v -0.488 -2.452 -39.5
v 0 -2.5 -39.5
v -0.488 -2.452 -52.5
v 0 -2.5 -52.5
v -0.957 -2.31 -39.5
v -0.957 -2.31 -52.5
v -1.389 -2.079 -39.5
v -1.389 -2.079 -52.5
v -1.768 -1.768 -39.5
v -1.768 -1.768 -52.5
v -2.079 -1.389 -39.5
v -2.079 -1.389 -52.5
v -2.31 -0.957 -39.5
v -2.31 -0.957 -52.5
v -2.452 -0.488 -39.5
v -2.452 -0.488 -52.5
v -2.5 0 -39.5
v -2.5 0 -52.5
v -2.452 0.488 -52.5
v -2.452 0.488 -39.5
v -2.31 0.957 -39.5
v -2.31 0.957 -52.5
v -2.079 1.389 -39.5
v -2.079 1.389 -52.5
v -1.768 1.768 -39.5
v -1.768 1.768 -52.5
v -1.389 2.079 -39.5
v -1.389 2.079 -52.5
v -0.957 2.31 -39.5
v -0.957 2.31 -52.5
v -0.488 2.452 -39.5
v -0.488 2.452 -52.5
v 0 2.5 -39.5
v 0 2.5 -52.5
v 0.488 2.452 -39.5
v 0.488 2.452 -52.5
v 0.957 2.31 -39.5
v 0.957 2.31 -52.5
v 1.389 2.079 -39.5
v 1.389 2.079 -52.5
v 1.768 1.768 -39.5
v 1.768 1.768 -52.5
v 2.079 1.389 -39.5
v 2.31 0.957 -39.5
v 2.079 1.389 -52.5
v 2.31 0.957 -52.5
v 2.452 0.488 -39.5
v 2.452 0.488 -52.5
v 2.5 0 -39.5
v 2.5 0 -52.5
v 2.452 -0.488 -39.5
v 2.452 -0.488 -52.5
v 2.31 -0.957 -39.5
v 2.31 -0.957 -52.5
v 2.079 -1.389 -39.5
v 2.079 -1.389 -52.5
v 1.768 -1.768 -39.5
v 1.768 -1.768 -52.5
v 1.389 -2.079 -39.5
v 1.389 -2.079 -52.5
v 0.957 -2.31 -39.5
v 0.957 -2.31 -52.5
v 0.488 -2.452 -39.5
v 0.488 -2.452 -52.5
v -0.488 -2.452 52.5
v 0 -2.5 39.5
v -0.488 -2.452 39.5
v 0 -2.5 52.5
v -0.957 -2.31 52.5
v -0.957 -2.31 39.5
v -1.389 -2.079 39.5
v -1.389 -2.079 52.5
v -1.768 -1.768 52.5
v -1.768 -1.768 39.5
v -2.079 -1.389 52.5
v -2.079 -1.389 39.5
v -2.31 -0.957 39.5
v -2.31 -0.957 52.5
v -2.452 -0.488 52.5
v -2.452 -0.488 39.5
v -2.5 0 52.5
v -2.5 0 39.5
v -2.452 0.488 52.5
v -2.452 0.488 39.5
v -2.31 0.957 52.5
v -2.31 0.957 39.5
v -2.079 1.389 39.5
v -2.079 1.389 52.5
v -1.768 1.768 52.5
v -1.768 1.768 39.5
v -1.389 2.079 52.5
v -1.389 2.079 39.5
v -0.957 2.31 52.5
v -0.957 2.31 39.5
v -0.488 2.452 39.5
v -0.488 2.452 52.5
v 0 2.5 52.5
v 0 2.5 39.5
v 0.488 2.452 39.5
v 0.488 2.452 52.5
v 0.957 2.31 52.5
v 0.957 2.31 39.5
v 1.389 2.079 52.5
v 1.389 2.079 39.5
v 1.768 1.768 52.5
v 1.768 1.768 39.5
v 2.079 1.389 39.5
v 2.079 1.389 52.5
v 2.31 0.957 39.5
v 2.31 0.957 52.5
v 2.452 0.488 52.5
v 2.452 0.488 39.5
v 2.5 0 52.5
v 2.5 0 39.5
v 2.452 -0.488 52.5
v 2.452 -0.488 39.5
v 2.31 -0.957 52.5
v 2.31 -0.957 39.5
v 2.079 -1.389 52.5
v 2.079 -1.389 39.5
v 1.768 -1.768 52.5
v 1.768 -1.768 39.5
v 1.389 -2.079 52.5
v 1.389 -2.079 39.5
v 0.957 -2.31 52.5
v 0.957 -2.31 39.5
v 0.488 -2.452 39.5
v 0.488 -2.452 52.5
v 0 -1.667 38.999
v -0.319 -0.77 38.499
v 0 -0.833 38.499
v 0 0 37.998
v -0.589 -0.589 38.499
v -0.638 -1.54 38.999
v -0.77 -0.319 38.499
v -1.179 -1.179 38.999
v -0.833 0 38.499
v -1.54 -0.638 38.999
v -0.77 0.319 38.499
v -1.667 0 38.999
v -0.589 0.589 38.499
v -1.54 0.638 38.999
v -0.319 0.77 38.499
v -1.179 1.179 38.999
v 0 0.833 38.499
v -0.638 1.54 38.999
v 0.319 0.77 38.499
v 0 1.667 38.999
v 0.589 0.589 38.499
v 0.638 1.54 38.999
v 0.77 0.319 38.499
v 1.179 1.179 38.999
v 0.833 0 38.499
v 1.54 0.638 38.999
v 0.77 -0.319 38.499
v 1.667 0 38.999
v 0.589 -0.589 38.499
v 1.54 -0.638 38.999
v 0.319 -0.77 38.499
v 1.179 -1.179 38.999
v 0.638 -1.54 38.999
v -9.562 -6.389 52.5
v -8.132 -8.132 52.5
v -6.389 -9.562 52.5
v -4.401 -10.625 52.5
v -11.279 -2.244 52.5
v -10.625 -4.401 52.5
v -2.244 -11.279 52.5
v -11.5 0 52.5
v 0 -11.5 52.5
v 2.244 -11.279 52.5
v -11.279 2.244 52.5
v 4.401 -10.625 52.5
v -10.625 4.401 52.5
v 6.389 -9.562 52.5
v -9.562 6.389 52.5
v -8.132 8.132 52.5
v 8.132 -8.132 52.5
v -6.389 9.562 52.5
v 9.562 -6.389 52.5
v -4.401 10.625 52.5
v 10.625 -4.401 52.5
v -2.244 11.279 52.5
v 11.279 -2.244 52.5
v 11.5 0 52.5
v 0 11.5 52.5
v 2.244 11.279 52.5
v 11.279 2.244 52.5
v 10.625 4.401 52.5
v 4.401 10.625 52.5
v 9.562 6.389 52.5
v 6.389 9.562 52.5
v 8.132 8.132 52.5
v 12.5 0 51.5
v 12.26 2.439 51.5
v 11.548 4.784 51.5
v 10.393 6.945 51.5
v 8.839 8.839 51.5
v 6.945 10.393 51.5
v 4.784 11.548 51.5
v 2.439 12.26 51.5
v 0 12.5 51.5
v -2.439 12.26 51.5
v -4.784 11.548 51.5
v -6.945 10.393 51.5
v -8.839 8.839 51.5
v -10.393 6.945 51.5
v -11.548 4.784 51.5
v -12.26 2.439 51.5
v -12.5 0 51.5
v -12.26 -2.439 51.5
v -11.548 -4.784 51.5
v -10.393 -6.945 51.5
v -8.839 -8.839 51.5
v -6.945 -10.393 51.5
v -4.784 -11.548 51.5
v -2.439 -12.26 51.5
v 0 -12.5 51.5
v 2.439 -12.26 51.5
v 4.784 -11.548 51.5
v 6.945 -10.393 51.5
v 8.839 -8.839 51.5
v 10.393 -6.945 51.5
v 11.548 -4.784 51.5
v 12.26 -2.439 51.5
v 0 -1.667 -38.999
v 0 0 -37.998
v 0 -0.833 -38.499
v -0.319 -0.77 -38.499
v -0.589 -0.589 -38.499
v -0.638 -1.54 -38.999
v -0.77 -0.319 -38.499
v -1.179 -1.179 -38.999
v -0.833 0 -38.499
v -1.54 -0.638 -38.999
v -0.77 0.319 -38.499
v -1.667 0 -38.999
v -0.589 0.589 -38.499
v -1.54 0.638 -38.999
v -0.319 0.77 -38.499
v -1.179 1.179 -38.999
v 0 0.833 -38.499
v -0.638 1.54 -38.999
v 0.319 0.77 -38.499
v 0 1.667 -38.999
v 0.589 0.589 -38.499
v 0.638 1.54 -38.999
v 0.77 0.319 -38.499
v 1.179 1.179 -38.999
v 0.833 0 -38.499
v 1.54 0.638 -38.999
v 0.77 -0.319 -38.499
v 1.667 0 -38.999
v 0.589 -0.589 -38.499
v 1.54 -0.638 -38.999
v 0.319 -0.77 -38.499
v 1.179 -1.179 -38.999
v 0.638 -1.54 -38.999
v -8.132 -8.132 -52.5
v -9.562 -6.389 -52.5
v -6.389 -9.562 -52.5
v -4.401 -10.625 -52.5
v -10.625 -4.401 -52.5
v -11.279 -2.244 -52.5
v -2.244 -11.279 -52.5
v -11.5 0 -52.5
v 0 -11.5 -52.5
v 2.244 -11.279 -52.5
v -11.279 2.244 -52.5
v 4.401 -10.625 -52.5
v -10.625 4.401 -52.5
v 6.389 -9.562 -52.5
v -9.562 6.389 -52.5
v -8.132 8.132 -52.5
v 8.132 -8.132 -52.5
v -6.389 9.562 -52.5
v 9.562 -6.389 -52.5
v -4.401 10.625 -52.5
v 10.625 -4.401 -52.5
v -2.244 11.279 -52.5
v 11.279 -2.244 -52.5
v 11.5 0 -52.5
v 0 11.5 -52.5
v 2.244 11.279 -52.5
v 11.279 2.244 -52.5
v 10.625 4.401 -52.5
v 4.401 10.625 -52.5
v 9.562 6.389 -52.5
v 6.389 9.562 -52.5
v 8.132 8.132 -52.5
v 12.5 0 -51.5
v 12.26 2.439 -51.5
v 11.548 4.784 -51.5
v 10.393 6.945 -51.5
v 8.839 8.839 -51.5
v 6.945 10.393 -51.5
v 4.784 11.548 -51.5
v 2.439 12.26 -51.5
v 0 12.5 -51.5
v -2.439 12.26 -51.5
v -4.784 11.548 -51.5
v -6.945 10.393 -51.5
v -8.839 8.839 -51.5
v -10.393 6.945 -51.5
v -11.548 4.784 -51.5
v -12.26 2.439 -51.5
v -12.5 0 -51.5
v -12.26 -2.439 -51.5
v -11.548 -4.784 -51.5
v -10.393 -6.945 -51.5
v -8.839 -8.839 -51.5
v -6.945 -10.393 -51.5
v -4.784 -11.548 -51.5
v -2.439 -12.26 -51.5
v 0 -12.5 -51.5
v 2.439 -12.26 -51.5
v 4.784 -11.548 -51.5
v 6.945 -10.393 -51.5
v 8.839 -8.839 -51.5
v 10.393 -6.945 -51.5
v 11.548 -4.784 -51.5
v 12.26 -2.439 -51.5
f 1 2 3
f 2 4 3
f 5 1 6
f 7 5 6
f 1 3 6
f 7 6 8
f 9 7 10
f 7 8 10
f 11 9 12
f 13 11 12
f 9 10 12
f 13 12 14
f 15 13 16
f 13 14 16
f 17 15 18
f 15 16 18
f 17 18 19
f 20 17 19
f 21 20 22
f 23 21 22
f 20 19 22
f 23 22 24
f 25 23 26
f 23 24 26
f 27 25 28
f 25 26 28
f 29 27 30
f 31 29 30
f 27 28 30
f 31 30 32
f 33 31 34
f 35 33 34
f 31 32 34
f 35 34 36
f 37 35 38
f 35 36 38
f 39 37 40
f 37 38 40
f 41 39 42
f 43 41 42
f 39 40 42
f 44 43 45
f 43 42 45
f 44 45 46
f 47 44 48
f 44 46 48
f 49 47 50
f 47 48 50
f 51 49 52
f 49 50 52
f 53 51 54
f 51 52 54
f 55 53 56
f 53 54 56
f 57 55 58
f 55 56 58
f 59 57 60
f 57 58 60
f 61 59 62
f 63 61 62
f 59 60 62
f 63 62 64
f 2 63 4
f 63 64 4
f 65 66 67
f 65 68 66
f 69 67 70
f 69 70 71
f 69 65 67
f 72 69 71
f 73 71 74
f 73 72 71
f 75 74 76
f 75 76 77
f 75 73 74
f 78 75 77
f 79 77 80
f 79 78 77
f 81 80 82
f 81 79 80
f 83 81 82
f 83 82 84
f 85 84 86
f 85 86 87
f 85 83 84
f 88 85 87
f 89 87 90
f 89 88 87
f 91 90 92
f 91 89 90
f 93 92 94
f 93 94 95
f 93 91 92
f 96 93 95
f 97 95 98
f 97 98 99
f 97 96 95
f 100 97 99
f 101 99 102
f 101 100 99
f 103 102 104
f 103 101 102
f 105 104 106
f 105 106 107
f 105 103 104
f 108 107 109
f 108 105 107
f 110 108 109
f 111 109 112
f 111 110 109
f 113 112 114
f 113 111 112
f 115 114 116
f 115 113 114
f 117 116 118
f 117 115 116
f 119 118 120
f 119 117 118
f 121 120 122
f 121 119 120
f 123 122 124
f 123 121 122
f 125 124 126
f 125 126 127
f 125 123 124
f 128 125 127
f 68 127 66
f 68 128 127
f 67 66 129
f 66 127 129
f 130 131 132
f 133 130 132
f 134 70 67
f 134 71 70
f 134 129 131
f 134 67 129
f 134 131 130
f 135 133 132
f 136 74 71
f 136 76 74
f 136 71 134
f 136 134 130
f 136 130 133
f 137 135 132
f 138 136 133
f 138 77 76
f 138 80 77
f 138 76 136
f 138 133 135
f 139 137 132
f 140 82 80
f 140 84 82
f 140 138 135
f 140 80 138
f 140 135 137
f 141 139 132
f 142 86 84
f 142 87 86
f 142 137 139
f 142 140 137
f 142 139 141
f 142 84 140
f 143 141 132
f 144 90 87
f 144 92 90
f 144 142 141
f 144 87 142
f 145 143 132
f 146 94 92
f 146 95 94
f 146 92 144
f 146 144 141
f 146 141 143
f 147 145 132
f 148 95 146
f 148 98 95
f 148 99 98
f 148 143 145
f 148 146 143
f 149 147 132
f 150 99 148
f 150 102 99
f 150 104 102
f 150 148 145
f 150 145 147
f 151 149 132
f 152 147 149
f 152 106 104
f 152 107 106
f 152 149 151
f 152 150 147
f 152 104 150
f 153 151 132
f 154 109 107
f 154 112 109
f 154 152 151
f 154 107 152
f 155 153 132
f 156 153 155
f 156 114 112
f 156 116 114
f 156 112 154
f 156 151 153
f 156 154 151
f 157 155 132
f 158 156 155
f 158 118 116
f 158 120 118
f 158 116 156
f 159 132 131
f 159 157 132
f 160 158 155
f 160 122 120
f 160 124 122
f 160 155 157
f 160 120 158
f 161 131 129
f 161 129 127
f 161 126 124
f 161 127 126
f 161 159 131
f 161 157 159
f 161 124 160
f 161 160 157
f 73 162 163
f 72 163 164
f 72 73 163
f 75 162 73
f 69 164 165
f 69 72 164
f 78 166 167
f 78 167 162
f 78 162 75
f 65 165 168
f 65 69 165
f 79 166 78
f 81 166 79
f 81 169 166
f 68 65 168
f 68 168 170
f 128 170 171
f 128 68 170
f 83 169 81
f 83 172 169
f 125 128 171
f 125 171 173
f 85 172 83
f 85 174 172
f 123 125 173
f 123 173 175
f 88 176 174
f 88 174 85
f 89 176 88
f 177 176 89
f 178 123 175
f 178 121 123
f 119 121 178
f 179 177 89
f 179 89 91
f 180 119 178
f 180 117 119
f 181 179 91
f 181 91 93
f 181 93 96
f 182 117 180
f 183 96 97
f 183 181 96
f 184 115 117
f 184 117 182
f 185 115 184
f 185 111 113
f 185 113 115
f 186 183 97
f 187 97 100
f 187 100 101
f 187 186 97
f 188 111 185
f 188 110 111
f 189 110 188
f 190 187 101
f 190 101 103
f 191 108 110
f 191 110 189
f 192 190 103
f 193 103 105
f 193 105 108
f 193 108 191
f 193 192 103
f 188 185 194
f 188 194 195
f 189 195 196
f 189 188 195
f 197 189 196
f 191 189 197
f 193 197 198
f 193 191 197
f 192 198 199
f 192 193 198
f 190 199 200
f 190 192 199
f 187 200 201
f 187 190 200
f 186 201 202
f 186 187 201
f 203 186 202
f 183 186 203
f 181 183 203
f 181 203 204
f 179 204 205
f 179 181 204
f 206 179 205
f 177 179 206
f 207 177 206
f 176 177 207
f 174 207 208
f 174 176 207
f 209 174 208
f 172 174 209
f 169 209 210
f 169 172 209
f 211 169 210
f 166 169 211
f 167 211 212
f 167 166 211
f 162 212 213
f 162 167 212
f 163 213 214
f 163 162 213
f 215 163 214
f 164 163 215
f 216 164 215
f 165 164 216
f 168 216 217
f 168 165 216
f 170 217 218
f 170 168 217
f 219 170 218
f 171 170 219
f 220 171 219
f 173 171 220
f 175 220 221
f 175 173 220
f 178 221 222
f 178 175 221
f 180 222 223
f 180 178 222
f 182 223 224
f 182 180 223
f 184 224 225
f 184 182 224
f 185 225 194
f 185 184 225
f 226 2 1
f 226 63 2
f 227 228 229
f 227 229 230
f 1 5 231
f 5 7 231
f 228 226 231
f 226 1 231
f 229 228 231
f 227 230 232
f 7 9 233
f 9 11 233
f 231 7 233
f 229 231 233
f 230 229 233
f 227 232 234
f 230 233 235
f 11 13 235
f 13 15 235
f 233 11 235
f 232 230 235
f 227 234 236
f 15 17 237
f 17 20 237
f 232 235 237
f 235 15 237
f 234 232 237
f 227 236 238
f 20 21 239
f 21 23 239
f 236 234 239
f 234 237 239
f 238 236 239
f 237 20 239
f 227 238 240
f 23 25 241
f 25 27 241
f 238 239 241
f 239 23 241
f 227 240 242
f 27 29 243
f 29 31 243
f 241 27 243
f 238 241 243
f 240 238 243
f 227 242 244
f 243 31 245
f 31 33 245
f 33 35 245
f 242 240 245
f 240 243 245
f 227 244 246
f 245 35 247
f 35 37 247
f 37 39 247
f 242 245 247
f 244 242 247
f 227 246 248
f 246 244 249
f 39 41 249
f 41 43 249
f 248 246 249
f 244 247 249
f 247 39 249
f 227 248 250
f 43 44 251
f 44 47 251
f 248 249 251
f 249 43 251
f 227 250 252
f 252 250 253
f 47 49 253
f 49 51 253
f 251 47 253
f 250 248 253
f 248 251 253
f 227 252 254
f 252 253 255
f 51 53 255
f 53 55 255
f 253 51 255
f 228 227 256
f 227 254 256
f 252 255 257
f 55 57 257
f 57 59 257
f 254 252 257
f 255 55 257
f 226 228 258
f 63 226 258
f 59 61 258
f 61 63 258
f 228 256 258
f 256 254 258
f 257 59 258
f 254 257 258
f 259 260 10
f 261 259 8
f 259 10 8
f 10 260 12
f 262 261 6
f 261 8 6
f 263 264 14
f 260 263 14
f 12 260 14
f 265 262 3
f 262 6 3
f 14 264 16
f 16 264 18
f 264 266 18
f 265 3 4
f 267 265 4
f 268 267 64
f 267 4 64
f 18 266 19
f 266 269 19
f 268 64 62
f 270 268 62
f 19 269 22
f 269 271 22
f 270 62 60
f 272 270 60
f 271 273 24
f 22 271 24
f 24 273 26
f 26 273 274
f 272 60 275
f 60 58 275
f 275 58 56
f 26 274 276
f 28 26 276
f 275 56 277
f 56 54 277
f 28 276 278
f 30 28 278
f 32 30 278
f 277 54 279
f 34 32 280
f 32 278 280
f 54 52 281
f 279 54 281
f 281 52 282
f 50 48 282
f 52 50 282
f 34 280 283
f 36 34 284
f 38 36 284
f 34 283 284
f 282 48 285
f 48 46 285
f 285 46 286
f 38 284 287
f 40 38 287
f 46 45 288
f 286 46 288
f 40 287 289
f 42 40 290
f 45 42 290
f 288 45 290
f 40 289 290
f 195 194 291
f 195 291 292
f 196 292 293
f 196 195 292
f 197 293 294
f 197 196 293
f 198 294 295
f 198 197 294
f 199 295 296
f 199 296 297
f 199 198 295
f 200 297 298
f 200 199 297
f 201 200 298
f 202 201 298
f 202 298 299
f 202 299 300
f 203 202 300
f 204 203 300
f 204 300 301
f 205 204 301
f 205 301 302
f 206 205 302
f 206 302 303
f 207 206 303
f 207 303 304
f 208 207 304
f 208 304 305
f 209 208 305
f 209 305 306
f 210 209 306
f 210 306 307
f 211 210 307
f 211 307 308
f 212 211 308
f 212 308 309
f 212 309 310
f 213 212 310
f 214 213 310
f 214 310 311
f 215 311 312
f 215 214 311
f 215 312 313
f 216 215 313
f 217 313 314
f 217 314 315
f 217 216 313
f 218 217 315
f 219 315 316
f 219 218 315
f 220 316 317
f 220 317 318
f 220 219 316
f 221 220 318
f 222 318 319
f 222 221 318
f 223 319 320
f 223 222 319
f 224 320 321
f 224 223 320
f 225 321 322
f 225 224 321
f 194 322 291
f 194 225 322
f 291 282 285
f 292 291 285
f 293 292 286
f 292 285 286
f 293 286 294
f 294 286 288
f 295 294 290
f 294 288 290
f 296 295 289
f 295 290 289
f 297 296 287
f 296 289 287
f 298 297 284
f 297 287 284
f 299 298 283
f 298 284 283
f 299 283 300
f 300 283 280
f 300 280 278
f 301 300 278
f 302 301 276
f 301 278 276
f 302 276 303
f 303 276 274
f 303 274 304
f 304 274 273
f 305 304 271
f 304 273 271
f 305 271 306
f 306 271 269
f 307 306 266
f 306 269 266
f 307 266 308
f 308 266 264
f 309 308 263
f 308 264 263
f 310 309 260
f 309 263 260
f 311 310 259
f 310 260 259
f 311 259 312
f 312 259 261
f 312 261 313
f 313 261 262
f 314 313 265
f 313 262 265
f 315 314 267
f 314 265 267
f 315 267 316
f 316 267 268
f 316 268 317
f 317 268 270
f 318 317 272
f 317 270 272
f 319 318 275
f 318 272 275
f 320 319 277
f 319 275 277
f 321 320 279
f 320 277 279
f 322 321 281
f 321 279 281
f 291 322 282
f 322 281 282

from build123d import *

# Parameters (mm, degrees)
SKETCH1_R           = 12.5
BOSS_EXTRUDE1_DEPTH = 52.5
CHAMFER1_SIZE       = 1


with BuildPart() as part:
    # Sketch1 → Boss-Extrude1 (new body, symmetric)
    with BuildSketch(Plane.XY):
        Circle(SKETCH1_R)
    extrude(amount=BOSS_EXTRUDE1_DEPTH, both=True)

    # Chamfer1
    chamfer1_edges = [part.edges().sort_by_distance(p)[0] for p in [
        (-12.5, 0, -52.5),
        (-12.5, 0, 52.5),
    ]]
    chamfer(chamfer1_edges, length=CHAMFER1_SIZE)

    # Sketch4 → Tap Drill for M6 Tap1 (revolve, cut)
    with BuildSketch(Plane(origin=(0, 0, 52.5), x_dir=(0, -1, 0), z_dir=(1, 0, 0))):
        Polygon((0, 0), (0, 14.502151548), (2.5, 13), (2.5, 0), align=None)
    tap_drill_for_m6_tap1 = revolve(axis=Axis((0, 0, 58.85), (0, 0, -1)), mode=Mode.SUBTRACT)

    # Mirror1: Tap Drill for M6 Tap1 across plane
    add(tap_drill_for_m6_tap1.mirror(Plane.XY), mode=Mode.SUBTRACT)


solid = part.part
